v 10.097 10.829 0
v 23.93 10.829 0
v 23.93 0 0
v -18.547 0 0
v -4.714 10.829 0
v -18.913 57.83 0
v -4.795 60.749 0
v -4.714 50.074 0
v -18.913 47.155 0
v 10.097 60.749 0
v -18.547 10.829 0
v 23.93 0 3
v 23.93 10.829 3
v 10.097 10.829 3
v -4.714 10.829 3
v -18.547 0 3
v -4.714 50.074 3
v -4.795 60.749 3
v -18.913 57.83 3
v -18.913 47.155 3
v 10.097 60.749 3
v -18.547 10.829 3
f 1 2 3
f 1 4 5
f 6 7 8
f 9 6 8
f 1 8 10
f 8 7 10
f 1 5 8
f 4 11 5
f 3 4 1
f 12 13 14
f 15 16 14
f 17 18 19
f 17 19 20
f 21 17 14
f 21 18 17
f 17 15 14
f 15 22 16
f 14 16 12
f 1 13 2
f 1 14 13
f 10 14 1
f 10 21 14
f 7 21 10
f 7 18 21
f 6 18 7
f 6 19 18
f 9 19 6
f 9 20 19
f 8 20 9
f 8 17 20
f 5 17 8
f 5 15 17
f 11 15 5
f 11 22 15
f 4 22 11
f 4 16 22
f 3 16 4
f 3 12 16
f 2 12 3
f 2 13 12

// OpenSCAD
font="Bitstream Vera Sans:style=Bold";
//font="Titan One";
//font="Baskerville:style=Bold";
text_on_flat="1";
//text_on_flat2="Kingi";
text_size=40;
depth=3;
spacing=1;

frame_z_offset = 0.5*text_size;

frame_width=10;
frame_depth=20;
frame_cover_overlap=frame_width*0.8;
picture_overlap=frame_width-frame_cover_overlap;

picture_x=100;
picture_z=150;
picture_depth=0.5*frame_depth;

cover_spacing=0.4;
cover_wall_width=0.8;
cover_depth_multiplier=0.8;

module the_bar(length) {
  bar_depth = 0.33*depth;
  translate([0, 0, 0.5*bar_depth]) cube([length, 0.25*text_size, bar_depth], center=true);
}


module the_text(text, size) {
linear_extrude(height=depth, convexity=4)
    text(text, 
         size=size,
         font=font,
         halign="center",
         spacing=spacing);
}

module the_text_with_bar(text, size, length) {
linear_extrude(height=depth, convexity=4)
    text(text, 
         size=size,
         font=font,
         halign="center",
         spacing=spacing);
  the_bar(length);
}

module ibar(width, length) {
  cube([width, length, 0.33*depth]);
}


the_text(text_on_flat, 60);
//translate([0, -50, 0]) the_text_with_bar(text_on_flat2, 30, 110);
//the_frame();
//cover();
//translate([29.8, 18, 0]) ibar(6,6);
//translate([48.3, -29.5, 0]) ibar(7.35,7);
//translate([-23.8, -29.5, 0]) ibar(7.35,7);
